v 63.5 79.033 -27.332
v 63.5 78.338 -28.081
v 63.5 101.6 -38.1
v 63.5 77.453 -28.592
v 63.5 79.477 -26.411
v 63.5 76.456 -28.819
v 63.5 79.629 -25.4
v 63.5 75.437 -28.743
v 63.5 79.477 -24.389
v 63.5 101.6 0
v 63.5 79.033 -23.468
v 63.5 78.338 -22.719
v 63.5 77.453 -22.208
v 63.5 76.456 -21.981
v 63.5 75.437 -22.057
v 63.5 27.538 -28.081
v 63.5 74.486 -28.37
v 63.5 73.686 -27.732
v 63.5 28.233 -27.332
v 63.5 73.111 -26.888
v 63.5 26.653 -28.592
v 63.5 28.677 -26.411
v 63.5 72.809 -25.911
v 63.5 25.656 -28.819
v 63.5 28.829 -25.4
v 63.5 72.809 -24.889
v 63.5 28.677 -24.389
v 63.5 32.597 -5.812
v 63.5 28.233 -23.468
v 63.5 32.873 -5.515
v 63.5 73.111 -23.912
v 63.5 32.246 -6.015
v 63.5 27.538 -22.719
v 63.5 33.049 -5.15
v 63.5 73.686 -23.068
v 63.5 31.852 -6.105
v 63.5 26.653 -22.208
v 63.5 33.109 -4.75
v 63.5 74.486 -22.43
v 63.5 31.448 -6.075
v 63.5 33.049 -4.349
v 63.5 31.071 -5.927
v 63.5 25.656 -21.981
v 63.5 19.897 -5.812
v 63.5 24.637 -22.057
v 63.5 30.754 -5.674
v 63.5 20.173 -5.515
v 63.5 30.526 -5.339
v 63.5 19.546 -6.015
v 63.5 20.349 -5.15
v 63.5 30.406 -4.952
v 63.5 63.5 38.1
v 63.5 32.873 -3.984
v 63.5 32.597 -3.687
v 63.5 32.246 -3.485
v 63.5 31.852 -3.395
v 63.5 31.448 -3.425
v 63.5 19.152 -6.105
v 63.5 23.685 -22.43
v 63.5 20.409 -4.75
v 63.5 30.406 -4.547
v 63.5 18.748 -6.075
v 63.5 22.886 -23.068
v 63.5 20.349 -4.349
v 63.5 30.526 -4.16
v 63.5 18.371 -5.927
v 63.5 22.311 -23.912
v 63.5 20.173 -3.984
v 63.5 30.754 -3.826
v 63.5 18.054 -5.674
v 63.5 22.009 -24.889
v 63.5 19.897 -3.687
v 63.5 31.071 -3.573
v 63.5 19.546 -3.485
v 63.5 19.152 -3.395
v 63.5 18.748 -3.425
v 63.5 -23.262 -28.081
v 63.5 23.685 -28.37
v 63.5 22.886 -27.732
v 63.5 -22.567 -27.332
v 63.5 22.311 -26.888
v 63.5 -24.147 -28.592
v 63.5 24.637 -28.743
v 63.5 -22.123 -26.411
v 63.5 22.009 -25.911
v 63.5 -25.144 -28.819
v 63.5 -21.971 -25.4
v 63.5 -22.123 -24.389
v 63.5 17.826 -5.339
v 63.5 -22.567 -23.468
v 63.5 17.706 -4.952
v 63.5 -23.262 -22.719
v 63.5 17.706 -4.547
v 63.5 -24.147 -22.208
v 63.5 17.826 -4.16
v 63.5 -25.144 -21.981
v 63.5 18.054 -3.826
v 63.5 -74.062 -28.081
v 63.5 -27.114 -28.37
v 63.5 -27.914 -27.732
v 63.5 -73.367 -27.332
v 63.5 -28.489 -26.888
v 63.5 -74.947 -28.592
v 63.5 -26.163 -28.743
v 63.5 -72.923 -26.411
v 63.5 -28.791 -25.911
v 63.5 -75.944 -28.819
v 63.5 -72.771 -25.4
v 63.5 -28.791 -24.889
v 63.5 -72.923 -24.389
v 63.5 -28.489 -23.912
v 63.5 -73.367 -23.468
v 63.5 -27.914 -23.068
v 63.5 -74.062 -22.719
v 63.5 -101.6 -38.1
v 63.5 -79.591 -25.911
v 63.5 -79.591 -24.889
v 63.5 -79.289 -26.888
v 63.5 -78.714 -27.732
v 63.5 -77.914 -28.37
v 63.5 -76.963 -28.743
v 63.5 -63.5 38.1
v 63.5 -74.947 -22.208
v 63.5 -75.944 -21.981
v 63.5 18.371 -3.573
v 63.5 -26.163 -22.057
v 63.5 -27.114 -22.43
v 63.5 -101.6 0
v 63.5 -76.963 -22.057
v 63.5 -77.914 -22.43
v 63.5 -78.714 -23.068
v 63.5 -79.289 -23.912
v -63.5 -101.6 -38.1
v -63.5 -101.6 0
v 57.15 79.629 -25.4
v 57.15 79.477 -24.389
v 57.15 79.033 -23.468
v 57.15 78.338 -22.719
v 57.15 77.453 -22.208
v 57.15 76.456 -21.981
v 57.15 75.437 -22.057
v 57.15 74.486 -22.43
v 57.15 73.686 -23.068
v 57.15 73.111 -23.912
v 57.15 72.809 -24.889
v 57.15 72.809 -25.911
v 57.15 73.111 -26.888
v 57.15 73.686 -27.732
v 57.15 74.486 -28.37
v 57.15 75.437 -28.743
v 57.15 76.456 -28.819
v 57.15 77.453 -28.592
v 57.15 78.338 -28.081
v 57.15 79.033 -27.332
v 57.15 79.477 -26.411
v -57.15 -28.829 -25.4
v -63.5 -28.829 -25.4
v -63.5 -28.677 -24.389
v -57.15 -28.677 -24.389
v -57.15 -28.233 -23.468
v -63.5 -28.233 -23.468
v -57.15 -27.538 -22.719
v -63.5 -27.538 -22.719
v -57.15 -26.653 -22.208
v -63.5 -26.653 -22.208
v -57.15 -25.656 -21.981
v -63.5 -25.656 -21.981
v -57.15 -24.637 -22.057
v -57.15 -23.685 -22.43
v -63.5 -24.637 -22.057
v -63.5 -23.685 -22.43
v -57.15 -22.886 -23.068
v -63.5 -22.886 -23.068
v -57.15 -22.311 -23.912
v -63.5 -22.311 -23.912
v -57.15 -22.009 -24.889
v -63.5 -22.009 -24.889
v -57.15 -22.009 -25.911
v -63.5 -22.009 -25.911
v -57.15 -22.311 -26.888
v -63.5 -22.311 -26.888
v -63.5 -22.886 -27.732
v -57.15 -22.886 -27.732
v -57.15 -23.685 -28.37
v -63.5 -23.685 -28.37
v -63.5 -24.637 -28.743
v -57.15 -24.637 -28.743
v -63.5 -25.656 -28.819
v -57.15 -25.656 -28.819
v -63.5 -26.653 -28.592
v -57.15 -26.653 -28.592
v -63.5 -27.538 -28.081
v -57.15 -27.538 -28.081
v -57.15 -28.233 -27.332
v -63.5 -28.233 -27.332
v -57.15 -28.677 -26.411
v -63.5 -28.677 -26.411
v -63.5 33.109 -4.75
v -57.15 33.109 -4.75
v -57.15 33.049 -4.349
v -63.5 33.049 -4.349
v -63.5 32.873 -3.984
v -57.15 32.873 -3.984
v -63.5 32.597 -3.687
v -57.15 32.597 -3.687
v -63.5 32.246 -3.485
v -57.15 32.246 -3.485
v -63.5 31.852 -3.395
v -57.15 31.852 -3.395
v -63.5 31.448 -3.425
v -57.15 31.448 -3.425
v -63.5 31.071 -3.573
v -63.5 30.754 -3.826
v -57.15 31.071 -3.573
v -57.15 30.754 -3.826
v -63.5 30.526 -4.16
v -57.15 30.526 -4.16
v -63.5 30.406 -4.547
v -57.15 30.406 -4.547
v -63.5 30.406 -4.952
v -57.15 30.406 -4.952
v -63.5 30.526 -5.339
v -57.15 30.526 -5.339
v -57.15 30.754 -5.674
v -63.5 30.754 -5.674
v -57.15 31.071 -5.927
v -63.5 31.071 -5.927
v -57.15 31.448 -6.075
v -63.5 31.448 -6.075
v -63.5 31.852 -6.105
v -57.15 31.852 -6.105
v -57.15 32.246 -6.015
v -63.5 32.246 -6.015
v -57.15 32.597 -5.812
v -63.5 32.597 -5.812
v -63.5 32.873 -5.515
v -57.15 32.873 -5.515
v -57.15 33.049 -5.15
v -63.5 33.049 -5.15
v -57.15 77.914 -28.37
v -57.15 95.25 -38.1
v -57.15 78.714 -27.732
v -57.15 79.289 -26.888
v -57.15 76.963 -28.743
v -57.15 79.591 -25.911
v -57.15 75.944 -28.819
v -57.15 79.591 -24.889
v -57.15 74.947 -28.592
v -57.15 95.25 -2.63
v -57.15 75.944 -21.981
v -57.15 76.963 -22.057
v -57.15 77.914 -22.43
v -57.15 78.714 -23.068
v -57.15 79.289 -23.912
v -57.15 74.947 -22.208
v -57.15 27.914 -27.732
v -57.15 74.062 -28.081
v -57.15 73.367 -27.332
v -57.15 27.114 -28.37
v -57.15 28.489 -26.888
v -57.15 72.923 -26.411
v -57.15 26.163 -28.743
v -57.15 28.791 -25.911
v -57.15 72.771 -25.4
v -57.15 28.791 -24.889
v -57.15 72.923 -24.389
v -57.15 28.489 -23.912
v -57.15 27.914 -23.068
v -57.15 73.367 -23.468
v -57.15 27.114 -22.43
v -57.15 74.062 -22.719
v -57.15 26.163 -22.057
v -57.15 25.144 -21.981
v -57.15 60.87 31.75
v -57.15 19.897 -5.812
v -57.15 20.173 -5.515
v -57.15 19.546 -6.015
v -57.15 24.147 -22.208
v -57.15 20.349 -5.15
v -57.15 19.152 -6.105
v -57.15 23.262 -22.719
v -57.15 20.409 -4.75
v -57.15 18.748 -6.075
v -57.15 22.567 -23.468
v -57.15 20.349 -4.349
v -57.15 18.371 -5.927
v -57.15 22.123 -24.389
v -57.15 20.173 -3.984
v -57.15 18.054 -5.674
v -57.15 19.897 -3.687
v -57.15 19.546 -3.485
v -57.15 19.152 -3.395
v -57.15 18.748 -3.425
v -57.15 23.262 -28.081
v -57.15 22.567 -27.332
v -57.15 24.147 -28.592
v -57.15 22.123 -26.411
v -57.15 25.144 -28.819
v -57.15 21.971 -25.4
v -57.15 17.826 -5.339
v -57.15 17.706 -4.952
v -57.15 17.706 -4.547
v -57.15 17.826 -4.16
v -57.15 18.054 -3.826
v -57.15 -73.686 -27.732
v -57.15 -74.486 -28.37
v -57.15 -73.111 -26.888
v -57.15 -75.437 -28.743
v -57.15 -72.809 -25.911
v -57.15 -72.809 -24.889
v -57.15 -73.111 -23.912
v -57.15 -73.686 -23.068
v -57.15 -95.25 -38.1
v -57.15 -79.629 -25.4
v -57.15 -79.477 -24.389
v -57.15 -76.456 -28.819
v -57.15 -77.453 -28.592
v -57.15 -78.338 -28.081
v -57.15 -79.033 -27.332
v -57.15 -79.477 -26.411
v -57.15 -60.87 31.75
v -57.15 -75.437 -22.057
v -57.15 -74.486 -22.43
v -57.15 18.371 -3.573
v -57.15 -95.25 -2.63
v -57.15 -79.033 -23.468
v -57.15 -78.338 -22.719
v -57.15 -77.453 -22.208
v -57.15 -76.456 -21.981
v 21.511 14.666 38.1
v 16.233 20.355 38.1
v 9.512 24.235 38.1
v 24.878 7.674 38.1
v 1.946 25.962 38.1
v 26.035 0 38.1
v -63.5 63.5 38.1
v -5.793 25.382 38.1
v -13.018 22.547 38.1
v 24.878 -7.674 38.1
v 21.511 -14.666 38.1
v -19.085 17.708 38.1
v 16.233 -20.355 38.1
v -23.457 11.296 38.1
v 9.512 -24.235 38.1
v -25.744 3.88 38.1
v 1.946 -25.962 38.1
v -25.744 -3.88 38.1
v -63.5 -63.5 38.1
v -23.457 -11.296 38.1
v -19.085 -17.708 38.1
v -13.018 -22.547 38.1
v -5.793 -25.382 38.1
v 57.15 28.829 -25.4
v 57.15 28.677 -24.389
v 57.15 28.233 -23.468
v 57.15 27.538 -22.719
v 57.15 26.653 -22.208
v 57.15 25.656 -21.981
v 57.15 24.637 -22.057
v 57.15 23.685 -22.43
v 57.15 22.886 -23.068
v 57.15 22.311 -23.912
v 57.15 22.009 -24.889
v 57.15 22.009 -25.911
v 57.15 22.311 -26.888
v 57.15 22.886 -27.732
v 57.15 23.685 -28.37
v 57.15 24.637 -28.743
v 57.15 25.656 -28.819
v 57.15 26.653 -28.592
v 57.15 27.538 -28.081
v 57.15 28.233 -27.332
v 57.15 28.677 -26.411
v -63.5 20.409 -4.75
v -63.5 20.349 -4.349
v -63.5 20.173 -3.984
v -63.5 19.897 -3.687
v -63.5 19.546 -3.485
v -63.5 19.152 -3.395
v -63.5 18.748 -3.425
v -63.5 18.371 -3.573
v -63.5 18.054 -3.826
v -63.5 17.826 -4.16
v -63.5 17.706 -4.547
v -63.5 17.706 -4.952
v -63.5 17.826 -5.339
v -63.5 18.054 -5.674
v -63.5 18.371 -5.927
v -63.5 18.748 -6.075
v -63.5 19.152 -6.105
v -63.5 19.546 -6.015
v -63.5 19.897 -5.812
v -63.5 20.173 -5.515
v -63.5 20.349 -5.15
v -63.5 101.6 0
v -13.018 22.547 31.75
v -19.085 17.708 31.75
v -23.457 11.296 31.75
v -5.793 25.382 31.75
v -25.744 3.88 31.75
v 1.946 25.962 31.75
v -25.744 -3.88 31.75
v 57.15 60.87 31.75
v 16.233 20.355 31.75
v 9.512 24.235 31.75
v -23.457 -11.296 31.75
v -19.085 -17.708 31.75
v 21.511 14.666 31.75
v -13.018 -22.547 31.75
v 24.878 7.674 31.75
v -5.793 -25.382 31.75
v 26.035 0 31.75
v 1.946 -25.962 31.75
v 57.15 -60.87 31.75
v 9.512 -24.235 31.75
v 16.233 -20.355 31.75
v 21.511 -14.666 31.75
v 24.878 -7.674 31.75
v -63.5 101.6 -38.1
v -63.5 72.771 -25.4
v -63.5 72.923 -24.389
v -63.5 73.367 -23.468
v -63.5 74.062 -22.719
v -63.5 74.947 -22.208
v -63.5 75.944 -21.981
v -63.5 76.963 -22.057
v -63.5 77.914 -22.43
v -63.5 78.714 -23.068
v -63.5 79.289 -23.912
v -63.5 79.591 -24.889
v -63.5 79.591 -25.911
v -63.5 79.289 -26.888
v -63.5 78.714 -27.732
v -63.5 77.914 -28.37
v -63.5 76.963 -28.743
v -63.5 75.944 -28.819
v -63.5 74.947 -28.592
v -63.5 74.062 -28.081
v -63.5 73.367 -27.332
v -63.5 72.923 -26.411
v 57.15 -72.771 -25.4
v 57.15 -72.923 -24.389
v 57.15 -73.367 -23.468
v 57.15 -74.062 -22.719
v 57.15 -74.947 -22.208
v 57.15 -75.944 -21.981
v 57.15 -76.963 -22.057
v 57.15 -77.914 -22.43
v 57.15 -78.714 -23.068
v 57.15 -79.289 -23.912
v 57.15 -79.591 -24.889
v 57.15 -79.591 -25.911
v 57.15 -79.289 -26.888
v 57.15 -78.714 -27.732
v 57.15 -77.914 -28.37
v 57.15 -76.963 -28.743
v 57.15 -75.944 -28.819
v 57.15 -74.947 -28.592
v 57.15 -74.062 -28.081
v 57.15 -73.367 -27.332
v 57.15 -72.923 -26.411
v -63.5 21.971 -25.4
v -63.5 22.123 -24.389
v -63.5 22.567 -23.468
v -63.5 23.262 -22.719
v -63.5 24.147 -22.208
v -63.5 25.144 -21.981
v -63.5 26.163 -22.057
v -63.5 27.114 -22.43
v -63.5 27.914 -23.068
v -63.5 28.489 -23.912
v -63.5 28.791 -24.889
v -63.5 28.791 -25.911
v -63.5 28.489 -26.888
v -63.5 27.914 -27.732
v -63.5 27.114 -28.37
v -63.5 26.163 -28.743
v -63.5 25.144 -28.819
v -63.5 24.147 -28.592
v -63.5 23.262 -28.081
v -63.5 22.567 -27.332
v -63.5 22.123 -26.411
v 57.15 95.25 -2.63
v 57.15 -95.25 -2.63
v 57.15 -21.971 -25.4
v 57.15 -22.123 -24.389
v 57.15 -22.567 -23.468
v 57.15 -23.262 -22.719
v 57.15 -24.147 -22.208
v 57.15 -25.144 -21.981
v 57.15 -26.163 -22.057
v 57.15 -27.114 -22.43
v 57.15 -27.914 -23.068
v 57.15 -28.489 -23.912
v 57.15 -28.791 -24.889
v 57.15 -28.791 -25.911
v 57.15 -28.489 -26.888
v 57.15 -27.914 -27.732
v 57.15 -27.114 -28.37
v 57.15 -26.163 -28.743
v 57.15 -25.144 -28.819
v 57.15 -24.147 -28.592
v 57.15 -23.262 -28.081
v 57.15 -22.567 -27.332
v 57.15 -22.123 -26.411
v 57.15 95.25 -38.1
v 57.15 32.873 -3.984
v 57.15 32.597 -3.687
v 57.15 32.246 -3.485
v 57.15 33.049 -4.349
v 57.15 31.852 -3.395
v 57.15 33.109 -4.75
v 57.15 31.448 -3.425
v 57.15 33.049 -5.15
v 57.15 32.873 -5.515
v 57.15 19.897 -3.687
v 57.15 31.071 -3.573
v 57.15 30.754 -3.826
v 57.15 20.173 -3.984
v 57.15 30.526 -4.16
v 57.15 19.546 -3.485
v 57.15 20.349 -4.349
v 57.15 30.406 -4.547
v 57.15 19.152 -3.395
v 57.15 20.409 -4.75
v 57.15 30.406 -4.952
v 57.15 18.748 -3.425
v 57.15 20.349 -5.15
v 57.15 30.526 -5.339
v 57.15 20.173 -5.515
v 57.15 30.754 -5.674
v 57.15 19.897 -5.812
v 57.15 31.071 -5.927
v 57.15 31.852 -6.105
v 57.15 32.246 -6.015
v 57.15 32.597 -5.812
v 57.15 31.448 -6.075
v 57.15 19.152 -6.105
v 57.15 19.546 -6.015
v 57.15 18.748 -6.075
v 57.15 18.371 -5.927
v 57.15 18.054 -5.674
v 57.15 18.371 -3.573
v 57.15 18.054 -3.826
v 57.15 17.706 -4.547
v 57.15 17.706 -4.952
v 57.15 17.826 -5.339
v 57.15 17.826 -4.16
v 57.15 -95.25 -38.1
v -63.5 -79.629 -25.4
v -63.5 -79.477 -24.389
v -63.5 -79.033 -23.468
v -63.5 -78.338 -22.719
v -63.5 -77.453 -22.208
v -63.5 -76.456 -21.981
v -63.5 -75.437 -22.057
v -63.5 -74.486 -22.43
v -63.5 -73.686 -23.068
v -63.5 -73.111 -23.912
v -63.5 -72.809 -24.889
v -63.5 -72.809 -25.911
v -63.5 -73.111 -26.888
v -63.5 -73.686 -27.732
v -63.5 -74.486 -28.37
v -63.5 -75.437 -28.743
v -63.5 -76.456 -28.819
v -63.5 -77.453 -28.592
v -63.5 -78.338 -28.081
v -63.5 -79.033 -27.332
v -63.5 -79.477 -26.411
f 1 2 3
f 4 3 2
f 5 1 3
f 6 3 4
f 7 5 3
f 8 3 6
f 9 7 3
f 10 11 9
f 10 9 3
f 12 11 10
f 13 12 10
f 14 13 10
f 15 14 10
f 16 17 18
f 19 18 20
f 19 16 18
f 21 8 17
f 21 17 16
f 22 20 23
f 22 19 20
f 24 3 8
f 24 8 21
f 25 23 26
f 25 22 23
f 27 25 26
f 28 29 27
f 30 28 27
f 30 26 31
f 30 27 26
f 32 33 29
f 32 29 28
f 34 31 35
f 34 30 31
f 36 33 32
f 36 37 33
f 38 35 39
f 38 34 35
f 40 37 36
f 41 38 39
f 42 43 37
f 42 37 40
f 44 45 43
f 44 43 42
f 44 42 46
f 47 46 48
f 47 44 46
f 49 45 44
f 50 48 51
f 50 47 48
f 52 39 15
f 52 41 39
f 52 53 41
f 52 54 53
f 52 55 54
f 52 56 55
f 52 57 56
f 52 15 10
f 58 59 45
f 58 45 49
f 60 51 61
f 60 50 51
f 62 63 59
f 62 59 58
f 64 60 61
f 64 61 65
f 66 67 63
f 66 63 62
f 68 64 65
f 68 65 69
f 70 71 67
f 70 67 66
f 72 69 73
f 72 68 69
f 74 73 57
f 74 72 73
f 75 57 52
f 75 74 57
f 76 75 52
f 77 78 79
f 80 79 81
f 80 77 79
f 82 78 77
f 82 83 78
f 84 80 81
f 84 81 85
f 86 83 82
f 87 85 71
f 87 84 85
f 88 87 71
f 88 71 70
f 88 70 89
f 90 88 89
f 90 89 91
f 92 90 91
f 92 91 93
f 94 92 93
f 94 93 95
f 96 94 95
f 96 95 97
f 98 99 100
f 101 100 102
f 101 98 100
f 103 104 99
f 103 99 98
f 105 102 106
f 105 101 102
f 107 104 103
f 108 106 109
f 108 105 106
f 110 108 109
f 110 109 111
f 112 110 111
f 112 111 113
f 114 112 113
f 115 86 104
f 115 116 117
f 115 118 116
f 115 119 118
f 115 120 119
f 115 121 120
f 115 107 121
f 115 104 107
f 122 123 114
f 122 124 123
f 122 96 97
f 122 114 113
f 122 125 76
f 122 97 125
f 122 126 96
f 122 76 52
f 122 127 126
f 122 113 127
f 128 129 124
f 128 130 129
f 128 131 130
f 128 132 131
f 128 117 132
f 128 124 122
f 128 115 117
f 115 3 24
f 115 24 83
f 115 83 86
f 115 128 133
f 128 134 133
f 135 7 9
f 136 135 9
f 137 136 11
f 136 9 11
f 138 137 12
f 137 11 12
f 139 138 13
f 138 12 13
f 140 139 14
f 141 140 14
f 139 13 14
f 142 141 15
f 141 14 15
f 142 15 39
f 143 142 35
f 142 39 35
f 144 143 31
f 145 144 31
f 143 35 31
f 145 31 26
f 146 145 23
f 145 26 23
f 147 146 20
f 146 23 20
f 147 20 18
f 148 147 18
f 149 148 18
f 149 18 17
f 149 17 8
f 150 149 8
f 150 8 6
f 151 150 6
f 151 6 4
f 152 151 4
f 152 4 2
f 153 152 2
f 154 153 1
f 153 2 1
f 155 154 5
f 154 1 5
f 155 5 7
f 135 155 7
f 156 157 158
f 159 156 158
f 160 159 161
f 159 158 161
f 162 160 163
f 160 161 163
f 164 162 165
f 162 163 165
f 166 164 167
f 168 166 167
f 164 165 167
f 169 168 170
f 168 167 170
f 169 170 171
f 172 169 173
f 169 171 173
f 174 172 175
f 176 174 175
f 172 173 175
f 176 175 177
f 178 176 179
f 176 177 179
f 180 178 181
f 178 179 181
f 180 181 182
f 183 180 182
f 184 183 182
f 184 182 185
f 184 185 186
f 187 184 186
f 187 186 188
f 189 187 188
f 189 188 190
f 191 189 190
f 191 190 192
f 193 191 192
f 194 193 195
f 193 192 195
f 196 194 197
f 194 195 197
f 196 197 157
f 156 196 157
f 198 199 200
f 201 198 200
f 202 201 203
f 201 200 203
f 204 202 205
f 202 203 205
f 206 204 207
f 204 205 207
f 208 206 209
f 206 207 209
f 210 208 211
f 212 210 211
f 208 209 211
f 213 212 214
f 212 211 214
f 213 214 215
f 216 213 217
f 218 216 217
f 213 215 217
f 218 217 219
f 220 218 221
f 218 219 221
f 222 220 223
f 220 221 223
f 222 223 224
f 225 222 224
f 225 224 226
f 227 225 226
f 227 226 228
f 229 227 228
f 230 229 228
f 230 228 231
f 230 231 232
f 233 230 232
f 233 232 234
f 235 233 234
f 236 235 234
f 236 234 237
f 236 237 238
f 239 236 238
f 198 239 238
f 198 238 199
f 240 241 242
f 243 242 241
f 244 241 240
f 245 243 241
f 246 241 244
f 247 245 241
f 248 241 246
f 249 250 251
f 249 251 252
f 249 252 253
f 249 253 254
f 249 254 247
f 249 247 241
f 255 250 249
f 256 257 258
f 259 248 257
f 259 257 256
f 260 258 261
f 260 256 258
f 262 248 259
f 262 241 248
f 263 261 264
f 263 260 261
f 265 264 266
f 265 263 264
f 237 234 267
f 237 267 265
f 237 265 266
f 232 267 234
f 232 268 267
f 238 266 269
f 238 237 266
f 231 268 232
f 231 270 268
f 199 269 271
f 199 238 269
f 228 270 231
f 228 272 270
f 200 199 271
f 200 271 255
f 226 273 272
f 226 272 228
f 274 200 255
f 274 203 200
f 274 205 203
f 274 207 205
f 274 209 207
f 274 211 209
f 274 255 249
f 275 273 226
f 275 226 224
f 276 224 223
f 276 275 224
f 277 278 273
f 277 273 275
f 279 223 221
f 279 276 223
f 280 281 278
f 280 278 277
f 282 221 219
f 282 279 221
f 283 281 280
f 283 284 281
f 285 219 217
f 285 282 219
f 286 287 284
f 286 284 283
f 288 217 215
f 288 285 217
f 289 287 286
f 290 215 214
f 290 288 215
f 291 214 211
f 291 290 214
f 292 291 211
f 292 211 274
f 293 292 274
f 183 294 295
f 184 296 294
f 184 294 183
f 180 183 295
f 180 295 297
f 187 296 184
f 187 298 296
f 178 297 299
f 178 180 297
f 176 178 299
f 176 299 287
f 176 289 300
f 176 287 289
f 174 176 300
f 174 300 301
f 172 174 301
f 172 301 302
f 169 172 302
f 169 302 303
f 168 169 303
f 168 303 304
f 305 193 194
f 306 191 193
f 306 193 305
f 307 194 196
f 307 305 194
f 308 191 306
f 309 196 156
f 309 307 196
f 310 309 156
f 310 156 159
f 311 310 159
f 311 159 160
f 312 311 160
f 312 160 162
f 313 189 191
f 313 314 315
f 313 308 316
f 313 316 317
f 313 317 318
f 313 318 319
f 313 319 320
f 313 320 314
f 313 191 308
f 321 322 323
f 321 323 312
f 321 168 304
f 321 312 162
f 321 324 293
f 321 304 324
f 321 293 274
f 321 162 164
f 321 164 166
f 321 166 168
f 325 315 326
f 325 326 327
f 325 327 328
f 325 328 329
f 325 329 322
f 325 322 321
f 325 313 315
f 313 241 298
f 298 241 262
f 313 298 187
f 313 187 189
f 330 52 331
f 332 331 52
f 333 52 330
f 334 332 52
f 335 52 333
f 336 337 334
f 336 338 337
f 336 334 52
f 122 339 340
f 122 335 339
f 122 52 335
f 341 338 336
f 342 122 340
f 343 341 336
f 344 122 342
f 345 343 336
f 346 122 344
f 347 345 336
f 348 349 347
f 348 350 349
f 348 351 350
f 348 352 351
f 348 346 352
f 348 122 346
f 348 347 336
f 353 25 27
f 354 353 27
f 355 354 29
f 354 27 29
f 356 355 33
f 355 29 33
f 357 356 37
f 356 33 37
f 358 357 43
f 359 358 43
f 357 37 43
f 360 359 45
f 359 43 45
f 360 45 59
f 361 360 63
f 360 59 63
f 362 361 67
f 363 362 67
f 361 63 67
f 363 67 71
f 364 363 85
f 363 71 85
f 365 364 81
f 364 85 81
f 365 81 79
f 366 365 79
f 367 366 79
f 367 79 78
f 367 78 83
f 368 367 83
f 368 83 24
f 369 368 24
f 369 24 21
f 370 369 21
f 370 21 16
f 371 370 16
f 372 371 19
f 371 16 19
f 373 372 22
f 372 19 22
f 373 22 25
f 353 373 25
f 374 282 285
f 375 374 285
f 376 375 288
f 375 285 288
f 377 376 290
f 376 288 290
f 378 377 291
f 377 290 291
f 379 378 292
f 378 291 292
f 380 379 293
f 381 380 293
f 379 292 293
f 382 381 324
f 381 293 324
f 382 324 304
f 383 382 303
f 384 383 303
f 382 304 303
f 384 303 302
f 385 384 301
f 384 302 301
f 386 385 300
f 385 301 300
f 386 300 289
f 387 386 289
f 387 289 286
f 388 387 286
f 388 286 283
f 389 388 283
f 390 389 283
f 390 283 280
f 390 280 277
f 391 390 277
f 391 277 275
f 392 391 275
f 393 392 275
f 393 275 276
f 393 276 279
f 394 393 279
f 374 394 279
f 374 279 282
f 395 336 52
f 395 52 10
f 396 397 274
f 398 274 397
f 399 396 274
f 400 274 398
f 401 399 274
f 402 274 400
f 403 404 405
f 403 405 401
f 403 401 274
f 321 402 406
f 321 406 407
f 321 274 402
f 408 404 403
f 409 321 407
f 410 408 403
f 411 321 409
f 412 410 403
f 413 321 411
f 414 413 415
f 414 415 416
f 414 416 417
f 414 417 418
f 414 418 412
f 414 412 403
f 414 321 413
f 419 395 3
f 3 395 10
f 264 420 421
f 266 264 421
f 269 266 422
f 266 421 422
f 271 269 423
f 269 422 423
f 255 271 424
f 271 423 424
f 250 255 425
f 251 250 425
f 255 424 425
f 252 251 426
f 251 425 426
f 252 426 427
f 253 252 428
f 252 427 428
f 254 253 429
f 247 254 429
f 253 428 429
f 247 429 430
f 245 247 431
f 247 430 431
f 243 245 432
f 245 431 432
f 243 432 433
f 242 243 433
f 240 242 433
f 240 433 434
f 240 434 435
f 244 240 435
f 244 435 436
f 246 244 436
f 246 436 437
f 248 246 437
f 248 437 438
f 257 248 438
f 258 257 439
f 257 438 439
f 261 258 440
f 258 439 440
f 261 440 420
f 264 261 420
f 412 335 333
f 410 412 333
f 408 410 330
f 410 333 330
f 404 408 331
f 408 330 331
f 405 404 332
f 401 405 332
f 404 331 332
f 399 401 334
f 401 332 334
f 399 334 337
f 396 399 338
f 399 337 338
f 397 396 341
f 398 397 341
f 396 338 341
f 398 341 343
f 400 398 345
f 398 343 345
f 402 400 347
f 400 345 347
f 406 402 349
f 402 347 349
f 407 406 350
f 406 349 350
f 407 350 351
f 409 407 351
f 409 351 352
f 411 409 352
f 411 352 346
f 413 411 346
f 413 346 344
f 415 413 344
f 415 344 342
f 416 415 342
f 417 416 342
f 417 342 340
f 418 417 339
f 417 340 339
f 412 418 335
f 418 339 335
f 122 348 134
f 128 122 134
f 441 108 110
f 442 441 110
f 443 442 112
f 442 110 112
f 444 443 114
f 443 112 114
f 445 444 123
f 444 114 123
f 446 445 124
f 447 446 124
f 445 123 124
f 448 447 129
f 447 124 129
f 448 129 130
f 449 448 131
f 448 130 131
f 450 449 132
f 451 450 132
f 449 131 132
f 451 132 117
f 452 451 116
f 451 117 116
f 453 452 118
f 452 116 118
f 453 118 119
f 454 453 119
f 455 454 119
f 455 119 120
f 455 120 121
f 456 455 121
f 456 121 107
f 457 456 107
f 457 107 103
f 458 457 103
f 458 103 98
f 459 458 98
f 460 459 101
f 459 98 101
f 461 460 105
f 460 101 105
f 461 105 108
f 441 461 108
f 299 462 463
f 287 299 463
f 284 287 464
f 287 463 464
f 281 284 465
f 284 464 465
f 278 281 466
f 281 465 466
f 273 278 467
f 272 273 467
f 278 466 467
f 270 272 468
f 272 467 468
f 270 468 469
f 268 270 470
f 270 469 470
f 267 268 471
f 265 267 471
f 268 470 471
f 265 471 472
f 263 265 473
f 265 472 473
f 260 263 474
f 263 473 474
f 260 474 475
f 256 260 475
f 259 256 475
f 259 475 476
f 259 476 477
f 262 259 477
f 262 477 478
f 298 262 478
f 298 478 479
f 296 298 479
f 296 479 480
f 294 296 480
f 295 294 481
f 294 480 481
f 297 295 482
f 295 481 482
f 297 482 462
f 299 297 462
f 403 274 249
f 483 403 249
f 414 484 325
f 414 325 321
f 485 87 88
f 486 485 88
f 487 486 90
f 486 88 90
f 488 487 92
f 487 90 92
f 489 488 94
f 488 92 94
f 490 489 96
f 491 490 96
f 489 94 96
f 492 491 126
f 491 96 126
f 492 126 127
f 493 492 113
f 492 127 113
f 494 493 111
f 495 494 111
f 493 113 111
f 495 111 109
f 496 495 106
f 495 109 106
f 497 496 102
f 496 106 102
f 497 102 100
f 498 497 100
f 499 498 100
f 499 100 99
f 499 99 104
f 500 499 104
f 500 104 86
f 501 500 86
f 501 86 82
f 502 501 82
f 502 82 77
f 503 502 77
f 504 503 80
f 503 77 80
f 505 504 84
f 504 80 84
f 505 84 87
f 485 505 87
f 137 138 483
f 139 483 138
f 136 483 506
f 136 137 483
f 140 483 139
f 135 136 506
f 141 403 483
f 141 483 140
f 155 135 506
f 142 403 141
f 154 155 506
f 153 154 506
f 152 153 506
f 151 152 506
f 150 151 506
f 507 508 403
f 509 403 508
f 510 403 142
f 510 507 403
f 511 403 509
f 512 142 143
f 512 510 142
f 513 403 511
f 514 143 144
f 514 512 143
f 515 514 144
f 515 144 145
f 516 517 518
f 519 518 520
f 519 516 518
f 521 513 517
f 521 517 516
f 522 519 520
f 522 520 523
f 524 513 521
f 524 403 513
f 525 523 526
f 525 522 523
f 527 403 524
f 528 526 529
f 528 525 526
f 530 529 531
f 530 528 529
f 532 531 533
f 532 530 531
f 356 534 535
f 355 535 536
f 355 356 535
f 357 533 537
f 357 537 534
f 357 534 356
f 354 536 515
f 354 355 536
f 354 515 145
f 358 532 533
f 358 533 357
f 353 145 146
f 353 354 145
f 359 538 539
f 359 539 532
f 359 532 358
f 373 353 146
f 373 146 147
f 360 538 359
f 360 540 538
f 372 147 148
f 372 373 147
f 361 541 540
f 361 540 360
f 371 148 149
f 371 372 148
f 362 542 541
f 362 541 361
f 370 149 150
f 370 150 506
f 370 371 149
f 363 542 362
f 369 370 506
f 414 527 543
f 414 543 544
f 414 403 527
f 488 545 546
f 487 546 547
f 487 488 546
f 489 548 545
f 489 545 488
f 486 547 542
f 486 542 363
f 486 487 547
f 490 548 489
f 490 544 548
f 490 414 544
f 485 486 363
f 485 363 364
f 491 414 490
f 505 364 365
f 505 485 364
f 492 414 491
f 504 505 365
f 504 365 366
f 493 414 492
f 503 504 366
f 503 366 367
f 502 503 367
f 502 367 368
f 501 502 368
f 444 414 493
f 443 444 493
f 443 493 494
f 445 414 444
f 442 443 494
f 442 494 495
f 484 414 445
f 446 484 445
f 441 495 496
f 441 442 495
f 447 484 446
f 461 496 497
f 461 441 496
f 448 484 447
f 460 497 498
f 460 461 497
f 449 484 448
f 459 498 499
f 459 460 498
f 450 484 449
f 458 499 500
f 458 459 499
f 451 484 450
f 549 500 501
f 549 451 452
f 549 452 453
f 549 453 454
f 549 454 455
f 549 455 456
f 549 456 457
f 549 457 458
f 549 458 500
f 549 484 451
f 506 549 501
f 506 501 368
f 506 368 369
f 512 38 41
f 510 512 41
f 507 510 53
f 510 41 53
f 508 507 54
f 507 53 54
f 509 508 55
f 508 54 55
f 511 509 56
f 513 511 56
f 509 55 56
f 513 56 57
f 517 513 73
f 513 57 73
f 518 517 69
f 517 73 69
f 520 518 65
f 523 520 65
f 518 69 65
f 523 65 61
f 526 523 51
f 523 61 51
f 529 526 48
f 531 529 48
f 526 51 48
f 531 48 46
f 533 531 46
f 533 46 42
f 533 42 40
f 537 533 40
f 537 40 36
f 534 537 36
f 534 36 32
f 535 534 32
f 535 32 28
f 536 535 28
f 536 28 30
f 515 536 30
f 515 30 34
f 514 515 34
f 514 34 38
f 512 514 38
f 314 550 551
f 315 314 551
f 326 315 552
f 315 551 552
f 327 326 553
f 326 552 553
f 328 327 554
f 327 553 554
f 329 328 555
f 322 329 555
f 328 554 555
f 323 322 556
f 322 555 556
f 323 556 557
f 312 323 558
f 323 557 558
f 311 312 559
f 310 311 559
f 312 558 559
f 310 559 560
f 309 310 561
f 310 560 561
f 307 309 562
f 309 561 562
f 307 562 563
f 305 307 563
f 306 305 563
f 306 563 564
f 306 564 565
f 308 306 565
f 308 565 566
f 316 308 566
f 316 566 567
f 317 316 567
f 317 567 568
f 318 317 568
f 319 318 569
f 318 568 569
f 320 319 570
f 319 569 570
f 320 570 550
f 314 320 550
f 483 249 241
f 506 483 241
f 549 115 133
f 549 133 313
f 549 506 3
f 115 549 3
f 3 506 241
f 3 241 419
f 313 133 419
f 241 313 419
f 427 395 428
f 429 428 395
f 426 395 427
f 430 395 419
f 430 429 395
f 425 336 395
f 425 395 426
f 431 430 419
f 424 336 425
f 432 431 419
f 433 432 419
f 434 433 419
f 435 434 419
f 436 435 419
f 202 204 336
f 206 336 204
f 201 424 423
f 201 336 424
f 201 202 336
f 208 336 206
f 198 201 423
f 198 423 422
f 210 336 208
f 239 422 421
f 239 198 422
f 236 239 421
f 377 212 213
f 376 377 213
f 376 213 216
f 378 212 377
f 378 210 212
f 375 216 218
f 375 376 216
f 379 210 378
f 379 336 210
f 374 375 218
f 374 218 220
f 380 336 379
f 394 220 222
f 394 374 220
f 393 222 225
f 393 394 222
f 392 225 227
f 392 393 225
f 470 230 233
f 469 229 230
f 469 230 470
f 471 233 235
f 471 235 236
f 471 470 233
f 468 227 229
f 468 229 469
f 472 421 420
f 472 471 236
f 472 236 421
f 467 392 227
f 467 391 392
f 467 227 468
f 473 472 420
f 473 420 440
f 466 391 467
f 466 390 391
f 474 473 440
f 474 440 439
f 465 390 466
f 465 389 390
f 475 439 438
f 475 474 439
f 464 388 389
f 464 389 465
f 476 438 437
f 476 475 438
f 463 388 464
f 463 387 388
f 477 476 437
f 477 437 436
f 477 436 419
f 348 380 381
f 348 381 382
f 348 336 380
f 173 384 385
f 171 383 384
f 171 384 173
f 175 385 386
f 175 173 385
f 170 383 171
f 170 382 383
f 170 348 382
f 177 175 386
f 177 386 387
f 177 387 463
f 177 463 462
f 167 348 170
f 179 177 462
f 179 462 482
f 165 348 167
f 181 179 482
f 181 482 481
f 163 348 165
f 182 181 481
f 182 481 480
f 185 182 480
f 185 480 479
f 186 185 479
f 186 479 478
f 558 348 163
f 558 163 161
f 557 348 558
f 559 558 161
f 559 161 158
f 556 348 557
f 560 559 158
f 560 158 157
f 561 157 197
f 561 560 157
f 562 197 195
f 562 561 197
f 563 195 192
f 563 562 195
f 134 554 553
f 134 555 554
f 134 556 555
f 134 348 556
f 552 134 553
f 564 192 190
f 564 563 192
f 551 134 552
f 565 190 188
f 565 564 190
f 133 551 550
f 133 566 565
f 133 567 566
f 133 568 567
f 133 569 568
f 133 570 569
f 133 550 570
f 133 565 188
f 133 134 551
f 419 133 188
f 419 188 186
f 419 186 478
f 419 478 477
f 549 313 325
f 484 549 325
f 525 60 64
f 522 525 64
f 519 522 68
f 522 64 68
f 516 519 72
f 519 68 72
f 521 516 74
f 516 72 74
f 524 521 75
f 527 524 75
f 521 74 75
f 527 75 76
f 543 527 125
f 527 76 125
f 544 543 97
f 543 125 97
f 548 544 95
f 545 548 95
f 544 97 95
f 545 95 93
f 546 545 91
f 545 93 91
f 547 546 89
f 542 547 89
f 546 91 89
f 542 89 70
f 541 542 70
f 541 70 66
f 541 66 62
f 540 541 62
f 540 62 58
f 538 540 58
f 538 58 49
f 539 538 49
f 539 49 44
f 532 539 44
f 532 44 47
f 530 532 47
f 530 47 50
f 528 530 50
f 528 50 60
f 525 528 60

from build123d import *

# Parameters (mm, degrees)
F1_DEPTH  = 101.6
F3_R      = 3.429
F4_DEPTH  = 6.35
F2_R      = 3.429
F5_DEPTH  = 6.35
F6_R      = 26.035
F7_DEPTH  = 6.35
F8_R      = 1.3589
F9_DEPTH  = 127.001
F11_DEPTH = 127.001
F13_DEPTH = 114.3


with BuildPart() as f1:
    # F0 (on Front) → F1 (new body, symmetric)
    with BuildSketch(Plane.XZ):
        Polygon((-57.15, -38.1), (-57.15, 31.75), (57.15, 31.75), (57.15, -38.1), (63.5, -38.1), (63.5, 38.1), (-63.5, 38.1), (-63.5, -38.1), align=None)
    extrude(amount=F1_DEPTH, both=True)

    # F3 (on face) → F4 (cut)
    with BuildSketch(Plane(origin=(-63.5, 0, 0), x_dir=(0, -1, 0), z_dir=(-1, 0, 0))):
        with Locations((-76.2, -25.4)):
            Circle(F3_R)
        with Locations((-25.4, -25.4)):
            Circle(F3_R)
        with Locations((25.4, -25.4)):
            Circle(F3_R)
        with Locations((76.2, -25.4)):
            Circle(F3_R)
    extrude(amount=-F4_DEPTH, mode=Mode.SUBTRACT)

    # F2 (on face) → F5 (cut)
    with BuildSketch(Plane.YZ.offset(63.5)):
        with Locations((-76.2, -25.4)):
            Circle(F2_R)
        with Locations((-25.4, -25.4)):
            Circle(F2_R)
        with Locations((25.4, -25.4)):
            Circle(F2_R)
        with Locations((76.2, -25.4)):
            Circle(F2_R)
    extrude(amount=-F5_DEPTH, mode=Mode.SUBTRACT)

    # F6 (on face) → F7 (cut)
    with BuildSketch(Plane.XY.offset(38.1)):
        Circle(F6_R)
    extrude(amount=-F7_DEPTH, mode=Mode.SUBTRACT)

    # F8 (on face) → F9 (cut, through all)
    with BuildSketch(Plane.YZ.offset(63.5)):
        with Locations((19.05, -4.7498)):
            Circle(F8_R)
        with Locations((31.75, -4.7498)):
            Circle(F8_R)
    extrude(amount=-F9_DEPTH, mode=Mode.SUBTRACT)

    # F10 (on face) → F11 (cut, through all)
    with BuildSketch(Plane.YZ.offset(63.5)):
        Polygon((-63.5, 38.1), (-101.6, 38.1), (-101.6, 0), align=None)
        Polygon((63.5, 38.1), (101.6, 0), (101.6, 38.1), align=None)
    extrude(amount=-F11_DEPTH, mode=Mode.SUBTRACT)

    # F12 (on face) → F13 (join, through all)
    with BuildSketch(Plane.YZ.offset(-57.15)):
        Polygon((-69.85, 31.75), (-101.6, 0), (-101.6, -38.1), (-95.25, -38.1), (-95.25, -2.630256), (-60.869744, 31.75), align=None)
        Polygon((95.25, -2.630256), (95.25, -38.1), (101.6, -38.1), (101.6, 0), (69.85, 31.75), (60.869744, 31.75), align=None)
    extrude(amount=F13_DEPTH)


solid = f1.part
